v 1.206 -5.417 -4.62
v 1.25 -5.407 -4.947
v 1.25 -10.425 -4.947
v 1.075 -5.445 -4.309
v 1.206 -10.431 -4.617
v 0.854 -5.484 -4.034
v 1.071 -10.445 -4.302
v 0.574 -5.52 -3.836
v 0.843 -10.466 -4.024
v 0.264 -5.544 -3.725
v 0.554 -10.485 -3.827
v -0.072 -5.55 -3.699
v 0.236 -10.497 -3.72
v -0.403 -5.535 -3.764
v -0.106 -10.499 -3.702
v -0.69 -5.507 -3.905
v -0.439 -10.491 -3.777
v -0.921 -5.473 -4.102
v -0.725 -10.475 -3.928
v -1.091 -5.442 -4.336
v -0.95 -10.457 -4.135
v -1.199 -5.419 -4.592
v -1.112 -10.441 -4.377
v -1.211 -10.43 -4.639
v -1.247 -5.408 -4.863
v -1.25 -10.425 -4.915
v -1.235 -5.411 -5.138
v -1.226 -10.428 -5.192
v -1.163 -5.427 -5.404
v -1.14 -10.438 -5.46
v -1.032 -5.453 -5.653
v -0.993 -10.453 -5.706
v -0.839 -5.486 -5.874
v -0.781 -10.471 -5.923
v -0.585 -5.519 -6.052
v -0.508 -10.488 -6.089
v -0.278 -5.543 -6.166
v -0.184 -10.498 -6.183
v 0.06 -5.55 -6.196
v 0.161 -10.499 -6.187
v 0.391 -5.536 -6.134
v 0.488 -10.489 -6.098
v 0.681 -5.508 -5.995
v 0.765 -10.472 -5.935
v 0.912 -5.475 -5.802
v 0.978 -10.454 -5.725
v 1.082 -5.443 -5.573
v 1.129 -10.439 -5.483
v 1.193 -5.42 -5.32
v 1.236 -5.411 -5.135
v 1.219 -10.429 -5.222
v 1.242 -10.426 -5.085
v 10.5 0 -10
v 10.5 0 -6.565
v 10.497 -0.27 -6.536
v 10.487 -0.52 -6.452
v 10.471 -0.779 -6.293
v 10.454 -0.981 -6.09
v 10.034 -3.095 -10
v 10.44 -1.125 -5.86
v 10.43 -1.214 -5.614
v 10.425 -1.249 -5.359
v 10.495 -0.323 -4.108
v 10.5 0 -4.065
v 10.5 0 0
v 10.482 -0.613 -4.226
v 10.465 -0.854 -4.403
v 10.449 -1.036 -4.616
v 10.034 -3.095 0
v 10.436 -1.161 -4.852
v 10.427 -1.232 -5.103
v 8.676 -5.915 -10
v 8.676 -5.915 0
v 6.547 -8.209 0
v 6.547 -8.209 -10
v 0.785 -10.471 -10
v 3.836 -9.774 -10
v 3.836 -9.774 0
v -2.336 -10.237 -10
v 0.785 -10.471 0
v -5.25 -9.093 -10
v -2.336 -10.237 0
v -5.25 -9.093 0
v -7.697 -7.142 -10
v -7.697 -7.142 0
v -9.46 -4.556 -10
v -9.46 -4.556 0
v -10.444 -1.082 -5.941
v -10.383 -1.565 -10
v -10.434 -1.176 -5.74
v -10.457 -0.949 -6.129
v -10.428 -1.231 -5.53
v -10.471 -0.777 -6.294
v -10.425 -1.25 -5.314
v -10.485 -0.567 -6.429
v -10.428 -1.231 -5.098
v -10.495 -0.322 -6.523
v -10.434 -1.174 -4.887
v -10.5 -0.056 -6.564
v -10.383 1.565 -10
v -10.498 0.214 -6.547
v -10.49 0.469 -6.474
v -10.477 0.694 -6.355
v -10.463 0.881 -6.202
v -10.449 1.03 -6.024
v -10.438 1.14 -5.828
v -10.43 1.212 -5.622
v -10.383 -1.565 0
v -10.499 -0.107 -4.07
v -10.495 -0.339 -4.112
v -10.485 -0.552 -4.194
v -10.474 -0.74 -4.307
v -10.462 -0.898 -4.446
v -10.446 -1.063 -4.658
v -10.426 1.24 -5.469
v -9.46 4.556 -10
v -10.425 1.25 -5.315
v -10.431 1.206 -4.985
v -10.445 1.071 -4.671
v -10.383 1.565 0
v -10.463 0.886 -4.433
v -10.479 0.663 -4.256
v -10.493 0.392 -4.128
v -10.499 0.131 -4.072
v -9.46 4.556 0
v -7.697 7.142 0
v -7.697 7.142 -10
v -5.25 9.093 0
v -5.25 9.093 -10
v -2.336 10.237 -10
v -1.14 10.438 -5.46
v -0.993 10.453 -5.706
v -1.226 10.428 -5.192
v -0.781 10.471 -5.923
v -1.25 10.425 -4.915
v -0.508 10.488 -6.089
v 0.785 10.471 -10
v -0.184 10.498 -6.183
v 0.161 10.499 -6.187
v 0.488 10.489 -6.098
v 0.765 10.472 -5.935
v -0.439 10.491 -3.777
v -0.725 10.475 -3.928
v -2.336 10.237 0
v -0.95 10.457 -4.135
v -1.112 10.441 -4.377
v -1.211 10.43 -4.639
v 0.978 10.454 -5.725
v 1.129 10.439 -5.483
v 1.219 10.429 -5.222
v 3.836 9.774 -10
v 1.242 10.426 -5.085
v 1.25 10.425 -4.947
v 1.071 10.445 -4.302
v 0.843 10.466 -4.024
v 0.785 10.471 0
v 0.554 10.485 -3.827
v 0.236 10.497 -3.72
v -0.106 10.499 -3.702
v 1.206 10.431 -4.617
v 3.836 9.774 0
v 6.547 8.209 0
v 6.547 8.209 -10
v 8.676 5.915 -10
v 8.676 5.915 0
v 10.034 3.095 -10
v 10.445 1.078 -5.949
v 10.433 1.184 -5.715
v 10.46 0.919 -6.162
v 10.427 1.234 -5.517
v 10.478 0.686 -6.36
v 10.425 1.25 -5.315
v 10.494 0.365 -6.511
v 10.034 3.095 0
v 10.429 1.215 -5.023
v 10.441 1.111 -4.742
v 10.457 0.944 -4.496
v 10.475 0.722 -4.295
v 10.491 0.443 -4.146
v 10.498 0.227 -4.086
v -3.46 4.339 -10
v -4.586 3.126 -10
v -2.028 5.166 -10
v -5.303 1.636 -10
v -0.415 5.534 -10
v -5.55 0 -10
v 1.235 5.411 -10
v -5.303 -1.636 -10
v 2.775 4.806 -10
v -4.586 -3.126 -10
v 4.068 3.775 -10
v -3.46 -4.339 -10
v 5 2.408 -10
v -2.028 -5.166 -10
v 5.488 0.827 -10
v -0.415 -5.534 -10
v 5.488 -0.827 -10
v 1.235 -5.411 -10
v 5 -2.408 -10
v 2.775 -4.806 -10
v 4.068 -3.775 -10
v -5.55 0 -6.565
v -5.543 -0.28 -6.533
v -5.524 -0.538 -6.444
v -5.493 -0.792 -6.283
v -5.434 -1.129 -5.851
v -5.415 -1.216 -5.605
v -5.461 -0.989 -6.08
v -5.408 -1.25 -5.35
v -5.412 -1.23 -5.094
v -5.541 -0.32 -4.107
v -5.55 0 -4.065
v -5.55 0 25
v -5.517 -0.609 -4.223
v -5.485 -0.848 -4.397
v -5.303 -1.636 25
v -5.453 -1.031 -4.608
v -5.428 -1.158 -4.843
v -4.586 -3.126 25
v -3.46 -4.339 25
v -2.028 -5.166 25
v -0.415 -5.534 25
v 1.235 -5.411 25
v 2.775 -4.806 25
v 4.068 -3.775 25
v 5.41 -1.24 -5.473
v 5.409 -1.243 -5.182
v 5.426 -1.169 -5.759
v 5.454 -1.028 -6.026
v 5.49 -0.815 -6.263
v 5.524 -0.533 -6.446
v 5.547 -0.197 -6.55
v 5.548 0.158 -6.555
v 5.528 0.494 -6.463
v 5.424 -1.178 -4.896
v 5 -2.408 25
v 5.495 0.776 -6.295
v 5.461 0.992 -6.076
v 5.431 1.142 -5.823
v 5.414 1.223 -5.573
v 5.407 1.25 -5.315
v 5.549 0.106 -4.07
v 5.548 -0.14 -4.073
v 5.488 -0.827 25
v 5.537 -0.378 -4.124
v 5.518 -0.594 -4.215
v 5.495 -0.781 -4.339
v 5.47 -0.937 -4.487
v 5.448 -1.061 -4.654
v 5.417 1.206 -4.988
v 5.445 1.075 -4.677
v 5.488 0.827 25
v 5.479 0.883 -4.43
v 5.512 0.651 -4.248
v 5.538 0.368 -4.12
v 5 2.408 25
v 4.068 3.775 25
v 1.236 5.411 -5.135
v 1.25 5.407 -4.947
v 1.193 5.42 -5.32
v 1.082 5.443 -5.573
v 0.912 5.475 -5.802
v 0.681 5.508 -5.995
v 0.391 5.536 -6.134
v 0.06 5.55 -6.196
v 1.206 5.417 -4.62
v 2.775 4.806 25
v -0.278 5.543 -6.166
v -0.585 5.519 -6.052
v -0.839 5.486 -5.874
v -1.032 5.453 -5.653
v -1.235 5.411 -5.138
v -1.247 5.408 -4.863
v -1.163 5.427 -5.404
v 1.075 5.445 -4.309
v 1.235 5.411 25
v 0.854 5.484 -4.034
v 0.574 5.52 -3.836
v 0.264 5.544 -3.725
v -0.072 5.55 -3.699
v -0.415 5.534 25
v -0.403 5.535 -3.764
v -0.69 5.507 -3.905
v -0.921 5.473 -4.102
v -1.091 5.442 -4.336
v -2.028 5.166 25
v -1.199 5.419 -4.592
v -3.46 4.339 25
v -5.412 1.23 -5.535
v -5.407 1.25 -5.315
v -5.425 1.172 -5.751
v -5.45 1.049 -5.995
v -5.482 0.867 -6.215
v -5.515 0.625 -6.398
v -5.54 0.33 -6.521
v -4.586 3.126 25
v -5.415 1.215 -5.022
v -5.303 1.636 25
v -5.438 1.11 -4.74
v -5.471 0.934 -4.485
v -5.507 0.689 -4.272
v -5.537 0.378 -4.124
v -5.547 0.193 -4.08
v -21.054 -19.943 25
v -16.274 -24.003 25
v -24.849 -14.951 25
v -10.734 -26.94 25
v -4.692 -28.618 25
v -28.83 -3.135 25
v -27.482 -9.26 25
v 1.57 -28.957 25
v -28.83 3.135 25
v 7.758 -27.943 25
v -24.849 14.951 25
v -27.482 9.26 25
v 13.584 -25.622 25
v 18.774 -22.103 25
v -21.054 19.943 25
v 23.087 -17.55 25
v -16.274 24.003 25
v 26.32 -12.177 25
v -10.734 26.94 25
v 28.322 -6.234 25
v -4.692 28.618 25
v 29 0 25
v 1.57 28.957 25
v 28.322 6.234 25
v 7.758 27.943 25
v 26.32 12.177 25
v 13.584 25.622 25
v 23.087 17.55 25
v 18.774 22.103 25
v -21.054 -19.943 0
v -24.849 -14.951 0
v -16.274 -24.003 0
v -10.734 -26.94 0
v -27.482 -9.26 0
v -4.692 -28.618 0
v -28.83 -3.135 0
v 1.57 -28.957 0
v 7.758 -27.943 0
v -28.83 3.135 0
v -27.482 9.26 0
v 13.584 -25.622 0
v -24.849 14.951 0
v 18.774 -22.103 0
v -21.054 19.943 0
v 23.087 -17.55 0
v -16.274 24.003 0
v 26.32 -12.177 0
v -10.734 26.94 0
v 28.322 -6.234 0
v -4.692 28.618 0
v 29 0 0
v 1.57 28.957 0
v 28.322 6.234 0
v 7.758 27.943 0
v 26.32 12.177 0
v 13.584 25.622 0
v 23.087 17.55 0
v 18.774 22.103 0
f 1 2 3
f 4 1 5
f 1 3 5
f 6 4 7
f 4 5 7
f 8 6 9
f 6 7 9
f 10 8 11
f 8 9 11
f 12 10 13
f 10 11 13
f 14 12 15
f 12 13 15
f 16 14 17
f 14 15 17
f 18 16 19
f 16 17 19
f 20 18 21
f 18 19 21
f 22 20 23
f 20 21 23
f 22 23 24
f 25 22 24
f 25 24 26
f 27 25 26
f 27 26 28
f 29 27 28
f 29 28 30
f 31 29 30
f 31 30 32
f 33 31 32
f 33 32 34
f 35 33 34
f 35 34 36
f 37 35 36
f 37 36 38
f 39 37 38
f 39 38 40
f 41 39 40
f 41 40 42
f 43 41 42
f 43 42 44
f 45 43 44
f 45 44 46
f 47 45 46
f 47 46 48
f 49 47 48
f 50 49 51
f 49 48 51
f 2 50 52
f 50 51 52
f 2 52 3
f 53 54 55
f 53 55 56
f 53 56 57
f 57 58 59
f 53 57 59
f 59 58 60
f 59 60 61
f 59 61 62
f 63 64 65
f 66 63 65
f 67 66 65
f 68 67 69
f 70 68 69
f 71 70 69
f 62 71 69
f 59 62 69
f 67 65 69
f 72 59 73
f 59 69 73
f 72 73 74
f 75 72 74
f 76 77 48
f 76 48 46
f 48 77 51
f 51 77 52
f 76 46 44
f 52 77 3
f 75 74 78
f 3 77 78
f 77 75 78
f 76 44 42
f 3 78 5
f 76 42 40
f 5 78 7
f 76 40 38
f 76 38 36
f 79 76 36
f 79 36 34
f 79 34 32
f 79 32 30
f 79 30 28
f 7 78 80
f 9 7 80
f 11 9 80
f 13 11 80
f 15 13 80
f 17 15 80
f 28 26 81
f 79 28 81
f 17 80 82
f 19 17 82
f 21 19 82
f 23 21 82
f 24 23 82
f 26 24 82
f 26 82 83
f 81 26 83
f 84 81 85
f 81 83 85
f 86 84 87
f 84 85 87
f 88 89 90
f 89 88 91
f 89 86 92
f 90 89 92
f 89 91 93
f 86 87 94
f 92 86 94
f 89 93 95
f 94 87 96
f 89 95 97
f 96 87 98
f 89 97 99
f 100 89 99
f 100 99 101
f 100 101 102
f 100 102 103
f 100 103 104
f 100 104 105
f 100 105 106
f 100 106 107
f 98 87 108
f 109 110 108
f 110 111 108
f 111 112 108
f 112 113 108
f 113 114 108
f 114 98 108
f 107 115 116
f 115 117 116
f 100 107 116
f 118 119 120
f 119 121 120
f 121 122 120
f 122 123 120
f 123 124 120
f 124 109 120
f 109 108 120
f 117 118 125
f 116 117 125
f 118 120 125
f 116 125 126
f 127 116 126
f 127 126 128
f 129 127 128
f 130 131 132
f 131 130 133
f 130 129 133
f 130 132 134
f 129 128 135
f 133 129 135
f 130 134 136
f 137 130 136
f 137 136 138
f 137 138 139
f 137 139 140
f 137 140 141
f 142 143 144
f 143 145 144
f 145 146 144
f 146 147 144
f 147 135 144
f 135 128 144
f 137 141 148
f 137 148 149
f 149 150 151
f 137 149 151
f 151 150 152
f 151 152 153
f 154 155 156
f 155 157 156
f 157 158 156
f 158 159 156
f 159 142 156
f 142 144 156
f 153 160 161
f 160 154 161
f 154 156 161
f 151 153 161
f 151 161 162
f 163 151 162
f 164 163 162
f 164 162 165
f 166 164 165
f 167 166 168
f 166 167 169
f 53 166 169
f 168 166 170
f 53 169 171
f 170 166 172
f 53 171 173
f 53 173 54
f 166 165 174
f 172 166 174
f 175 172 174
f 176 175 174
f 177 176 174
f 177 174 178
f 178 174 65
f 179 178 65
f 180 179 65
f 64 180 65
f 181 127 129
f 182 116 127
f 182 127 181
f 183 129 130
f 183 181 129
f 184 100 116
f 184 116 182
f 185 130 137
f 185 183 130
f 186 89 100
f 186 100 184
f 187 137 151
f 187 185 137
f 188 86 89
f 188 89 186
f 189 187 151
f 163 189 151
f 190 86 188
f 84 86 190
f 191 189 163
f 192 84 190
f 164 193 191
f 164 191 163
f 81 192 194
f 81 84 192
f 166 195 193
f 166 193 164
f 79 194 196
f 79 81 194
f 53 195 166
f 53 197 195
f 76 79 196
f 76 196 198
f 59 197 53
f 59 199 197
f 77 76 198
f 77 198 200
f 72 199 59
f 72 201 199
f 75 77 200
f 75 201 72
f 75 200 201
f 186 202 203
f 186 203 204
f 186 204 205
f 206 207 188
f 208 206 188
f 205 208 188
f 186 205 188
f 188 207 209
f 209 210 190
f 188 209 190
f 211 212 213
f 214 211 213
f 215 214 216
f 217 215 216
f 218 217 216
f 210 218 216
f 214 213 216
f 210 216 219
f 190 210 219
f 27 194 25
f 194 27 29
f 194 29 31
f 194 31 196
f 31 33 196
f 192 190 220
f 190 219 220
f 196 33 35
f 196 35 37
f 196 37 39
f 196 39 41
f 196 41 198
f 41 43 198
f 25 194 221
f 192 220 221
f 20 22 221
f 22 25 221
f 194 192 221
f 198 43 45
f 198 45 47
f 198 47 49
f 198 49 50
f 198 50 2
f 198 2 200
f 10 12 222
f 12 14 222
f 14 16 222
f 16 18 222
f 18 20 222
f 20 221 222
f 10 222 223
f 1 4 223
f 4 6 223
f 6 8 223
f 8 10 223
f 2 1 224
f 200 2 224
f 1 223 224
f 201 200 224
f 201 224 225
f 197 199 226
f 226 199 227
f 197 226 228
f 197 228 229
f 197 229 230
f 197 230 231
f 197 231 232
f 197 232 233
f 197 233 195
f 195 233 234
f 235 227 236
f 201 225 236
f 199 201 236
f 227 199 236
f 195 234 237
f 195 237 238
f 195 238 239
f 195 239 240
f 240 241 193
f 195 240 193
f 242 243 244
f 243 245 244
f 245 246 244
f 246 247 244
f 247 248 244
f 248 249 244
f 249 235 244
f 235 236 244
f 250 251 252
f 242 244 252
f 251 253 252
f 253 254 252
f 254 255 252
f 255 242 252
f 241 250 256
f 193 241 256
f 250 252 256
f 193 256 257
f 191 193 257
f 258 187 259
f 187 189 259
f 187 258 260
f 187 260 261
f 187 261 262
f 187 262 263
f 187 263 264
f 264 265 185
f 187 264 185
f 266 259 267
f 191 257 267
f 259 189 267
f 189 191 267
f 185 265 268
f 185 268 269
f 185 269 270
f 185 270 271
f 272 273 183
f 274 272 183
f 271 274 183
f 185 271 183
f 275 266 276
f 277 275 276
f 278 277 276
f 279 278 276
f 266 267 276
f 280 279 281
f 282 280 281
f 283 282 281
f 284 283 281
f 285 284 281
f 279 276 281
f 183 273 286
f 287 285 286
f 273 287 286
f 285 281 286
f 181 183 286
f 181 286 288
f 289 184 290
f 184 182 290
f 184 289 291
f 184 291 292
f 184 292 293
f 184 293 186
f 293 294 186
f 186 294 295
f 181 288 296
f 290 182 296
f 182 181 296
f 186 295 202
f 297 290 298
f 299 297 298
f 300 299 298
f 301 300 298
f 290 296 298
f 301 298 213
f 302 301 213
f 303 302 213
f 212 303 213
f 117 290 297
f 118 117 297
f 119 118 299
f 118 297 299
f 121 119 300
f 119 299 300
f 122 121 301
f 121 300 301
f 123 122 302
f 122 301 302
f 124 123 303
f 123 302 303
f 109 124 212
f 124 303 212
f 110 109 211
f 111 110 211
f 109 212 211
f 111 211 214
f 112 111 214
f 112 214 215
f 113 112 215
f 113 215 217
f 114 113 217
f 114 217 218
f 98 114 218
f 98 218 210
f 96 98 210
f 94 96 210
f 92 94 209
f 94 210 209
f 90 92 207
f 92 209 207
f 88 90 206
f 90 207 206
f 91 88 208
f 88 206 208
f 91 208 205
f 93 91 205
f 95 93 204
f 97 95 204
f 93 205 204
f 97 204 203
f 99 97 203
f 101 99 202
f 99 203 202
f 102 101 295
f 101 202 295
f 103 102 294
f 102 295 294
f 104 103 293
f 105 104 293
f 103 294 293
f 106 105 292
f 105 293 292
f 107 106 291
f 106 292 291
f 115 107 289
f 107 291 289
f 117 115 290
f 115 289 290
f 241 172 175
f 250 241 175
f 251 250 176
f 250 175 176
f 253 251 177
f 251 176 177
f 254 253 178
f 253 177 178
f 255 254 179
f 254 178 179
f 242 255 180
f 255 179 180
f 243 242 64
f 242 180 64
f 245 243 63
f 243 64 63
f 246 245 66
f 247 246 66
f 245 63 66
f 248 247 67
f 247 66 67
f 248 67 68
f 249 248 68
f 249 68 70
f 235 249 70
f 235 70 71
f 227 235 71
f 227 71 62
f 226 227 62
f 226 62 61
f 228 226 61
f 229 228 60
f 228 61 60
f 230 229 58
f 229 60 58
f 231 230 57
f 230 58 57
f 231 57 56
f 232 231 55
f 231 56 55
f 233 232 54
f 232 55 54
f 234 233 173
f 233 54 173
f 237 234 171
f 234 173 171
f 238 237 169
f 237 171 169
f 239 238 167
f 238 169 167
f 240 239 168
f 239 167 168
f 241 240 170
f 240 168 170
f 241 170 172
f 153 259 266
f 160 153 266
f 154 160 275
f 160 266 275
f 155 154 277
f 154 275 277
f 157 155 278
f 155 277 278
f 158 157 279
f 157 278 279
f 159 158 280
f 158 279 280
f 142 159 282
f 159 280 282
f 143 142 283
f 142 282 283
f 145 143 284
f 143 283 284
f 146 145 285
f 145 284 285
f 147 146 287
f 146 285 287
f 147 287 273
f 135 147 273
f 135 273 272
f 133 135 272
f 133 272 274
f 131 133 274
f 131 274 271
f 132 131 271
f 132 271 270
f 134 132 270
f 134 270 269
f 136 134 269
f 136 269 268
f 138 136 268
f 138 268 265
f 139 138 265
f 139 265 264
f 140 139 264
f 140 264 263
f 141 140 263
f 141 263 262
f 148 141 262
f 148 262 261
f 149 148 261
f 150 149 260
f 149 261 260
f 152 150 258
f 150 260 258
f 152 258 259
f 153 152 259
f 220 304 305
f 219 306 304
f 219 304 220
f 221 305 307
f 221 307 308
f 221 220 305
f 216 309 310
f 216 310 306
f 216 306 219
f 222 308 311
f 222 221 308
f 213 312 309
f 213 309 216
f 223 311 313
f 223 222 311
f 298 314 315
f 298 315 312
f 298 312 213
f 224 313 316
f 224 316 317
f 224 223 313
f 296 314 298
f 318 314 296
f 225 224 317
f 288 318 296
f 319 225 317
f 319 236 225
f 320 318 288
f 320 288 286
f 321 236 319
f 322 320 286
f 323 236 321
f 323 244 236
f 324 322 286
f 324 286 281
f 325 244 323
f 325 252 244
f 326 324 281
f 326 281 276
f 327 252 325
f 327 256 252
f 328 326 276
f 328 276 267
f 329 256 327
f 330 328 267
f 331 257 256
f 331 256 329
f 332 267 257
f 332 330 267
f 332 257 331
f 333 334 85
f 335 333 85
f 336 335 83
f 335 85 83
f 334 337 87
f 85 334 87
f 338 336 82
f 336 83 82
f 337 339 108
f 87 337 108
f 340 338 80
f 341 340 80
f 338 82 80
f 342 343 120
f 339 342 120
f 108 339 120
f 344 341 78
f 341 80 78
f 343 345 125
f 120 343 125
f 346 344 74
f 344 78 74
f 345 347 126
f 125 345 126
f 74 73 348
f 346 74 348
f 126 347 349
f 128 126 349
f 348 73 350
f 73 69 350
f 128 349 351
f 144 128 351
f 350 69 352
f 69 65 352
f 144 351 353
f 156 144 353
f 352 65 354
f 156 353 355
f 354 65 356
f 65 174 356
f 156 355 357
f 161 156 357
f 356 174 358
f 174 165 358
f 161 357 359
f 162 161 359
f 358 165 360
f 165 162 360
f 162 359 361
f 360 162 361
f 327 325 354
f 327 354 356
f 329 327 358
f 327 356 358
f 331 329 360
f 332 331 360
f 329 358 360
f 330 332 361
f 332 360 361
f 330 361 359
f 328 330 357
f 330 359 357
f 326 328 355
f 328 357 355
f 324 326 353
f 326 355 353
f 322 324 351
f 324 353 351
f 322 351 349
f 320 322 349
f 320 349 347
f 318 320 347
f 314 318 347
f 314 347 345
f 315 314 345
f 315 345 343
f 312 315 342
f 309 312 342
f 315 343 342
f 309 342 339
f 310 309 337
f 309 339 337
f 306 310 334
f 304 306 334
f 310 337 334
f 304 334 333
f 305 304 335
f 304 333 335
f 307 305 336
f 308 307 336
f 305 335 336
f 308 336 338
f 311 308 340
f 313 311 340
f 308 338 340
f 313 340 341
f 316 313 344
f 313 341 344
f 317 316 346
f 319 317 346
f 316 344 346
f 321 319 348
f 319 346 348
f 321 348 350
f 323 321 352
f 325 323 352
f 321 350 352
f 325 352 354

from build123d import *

# Parameters (mm, degrees)
F0_R     = 29
F1_DEPTH = 25
F2_R     = 10.5
F3_DEPTH = 10
F5_D     = 11.1
F9_D     = 2.5
F13_D    = 2.5


with BuildPart() as f1:
    # F0 (on Top) → F1 (new body)
    with BuildSketch(Plane.XY):
        Circle(F0_R)
    extrude(amount=F1_DEPTH)

    # F2 (on face) → F3 (join)
    with BuildSketch(Plane(origin=(0, 0, 0), x_dir=(1, 0, 0), z_dir=(0, 0, -1))):
        Circle(F2_R)
    extrude(amount=F3_DEPTH)

    # F5 (through all)
    with Locations(Plane(origin=(0, 0, -10), x_dir=(1, 0, 0), z_dir=(0, 0, -1))):
        with Locations((0, 0)):
            Hole(F5_D / 2)

    # F9 (through all)
    with Locations(Plane(origin=(-10.5, 0, 0), x_dir=(0, -1, 0), z_dir=(-1, 0, 0))):
        with Locations((0, -5.3152111359)):
            Hole(F9_D / 2)

    # F13 (through all)
    with Locations(Plane(origin=(0, 10.5, 0), x_dir=(-1, 0, 0), z_dir=(0, 1, 0))):
        with Locations((0, -4.9469849671)):
            Hole(F13_D / 2)


solid = f1.part
